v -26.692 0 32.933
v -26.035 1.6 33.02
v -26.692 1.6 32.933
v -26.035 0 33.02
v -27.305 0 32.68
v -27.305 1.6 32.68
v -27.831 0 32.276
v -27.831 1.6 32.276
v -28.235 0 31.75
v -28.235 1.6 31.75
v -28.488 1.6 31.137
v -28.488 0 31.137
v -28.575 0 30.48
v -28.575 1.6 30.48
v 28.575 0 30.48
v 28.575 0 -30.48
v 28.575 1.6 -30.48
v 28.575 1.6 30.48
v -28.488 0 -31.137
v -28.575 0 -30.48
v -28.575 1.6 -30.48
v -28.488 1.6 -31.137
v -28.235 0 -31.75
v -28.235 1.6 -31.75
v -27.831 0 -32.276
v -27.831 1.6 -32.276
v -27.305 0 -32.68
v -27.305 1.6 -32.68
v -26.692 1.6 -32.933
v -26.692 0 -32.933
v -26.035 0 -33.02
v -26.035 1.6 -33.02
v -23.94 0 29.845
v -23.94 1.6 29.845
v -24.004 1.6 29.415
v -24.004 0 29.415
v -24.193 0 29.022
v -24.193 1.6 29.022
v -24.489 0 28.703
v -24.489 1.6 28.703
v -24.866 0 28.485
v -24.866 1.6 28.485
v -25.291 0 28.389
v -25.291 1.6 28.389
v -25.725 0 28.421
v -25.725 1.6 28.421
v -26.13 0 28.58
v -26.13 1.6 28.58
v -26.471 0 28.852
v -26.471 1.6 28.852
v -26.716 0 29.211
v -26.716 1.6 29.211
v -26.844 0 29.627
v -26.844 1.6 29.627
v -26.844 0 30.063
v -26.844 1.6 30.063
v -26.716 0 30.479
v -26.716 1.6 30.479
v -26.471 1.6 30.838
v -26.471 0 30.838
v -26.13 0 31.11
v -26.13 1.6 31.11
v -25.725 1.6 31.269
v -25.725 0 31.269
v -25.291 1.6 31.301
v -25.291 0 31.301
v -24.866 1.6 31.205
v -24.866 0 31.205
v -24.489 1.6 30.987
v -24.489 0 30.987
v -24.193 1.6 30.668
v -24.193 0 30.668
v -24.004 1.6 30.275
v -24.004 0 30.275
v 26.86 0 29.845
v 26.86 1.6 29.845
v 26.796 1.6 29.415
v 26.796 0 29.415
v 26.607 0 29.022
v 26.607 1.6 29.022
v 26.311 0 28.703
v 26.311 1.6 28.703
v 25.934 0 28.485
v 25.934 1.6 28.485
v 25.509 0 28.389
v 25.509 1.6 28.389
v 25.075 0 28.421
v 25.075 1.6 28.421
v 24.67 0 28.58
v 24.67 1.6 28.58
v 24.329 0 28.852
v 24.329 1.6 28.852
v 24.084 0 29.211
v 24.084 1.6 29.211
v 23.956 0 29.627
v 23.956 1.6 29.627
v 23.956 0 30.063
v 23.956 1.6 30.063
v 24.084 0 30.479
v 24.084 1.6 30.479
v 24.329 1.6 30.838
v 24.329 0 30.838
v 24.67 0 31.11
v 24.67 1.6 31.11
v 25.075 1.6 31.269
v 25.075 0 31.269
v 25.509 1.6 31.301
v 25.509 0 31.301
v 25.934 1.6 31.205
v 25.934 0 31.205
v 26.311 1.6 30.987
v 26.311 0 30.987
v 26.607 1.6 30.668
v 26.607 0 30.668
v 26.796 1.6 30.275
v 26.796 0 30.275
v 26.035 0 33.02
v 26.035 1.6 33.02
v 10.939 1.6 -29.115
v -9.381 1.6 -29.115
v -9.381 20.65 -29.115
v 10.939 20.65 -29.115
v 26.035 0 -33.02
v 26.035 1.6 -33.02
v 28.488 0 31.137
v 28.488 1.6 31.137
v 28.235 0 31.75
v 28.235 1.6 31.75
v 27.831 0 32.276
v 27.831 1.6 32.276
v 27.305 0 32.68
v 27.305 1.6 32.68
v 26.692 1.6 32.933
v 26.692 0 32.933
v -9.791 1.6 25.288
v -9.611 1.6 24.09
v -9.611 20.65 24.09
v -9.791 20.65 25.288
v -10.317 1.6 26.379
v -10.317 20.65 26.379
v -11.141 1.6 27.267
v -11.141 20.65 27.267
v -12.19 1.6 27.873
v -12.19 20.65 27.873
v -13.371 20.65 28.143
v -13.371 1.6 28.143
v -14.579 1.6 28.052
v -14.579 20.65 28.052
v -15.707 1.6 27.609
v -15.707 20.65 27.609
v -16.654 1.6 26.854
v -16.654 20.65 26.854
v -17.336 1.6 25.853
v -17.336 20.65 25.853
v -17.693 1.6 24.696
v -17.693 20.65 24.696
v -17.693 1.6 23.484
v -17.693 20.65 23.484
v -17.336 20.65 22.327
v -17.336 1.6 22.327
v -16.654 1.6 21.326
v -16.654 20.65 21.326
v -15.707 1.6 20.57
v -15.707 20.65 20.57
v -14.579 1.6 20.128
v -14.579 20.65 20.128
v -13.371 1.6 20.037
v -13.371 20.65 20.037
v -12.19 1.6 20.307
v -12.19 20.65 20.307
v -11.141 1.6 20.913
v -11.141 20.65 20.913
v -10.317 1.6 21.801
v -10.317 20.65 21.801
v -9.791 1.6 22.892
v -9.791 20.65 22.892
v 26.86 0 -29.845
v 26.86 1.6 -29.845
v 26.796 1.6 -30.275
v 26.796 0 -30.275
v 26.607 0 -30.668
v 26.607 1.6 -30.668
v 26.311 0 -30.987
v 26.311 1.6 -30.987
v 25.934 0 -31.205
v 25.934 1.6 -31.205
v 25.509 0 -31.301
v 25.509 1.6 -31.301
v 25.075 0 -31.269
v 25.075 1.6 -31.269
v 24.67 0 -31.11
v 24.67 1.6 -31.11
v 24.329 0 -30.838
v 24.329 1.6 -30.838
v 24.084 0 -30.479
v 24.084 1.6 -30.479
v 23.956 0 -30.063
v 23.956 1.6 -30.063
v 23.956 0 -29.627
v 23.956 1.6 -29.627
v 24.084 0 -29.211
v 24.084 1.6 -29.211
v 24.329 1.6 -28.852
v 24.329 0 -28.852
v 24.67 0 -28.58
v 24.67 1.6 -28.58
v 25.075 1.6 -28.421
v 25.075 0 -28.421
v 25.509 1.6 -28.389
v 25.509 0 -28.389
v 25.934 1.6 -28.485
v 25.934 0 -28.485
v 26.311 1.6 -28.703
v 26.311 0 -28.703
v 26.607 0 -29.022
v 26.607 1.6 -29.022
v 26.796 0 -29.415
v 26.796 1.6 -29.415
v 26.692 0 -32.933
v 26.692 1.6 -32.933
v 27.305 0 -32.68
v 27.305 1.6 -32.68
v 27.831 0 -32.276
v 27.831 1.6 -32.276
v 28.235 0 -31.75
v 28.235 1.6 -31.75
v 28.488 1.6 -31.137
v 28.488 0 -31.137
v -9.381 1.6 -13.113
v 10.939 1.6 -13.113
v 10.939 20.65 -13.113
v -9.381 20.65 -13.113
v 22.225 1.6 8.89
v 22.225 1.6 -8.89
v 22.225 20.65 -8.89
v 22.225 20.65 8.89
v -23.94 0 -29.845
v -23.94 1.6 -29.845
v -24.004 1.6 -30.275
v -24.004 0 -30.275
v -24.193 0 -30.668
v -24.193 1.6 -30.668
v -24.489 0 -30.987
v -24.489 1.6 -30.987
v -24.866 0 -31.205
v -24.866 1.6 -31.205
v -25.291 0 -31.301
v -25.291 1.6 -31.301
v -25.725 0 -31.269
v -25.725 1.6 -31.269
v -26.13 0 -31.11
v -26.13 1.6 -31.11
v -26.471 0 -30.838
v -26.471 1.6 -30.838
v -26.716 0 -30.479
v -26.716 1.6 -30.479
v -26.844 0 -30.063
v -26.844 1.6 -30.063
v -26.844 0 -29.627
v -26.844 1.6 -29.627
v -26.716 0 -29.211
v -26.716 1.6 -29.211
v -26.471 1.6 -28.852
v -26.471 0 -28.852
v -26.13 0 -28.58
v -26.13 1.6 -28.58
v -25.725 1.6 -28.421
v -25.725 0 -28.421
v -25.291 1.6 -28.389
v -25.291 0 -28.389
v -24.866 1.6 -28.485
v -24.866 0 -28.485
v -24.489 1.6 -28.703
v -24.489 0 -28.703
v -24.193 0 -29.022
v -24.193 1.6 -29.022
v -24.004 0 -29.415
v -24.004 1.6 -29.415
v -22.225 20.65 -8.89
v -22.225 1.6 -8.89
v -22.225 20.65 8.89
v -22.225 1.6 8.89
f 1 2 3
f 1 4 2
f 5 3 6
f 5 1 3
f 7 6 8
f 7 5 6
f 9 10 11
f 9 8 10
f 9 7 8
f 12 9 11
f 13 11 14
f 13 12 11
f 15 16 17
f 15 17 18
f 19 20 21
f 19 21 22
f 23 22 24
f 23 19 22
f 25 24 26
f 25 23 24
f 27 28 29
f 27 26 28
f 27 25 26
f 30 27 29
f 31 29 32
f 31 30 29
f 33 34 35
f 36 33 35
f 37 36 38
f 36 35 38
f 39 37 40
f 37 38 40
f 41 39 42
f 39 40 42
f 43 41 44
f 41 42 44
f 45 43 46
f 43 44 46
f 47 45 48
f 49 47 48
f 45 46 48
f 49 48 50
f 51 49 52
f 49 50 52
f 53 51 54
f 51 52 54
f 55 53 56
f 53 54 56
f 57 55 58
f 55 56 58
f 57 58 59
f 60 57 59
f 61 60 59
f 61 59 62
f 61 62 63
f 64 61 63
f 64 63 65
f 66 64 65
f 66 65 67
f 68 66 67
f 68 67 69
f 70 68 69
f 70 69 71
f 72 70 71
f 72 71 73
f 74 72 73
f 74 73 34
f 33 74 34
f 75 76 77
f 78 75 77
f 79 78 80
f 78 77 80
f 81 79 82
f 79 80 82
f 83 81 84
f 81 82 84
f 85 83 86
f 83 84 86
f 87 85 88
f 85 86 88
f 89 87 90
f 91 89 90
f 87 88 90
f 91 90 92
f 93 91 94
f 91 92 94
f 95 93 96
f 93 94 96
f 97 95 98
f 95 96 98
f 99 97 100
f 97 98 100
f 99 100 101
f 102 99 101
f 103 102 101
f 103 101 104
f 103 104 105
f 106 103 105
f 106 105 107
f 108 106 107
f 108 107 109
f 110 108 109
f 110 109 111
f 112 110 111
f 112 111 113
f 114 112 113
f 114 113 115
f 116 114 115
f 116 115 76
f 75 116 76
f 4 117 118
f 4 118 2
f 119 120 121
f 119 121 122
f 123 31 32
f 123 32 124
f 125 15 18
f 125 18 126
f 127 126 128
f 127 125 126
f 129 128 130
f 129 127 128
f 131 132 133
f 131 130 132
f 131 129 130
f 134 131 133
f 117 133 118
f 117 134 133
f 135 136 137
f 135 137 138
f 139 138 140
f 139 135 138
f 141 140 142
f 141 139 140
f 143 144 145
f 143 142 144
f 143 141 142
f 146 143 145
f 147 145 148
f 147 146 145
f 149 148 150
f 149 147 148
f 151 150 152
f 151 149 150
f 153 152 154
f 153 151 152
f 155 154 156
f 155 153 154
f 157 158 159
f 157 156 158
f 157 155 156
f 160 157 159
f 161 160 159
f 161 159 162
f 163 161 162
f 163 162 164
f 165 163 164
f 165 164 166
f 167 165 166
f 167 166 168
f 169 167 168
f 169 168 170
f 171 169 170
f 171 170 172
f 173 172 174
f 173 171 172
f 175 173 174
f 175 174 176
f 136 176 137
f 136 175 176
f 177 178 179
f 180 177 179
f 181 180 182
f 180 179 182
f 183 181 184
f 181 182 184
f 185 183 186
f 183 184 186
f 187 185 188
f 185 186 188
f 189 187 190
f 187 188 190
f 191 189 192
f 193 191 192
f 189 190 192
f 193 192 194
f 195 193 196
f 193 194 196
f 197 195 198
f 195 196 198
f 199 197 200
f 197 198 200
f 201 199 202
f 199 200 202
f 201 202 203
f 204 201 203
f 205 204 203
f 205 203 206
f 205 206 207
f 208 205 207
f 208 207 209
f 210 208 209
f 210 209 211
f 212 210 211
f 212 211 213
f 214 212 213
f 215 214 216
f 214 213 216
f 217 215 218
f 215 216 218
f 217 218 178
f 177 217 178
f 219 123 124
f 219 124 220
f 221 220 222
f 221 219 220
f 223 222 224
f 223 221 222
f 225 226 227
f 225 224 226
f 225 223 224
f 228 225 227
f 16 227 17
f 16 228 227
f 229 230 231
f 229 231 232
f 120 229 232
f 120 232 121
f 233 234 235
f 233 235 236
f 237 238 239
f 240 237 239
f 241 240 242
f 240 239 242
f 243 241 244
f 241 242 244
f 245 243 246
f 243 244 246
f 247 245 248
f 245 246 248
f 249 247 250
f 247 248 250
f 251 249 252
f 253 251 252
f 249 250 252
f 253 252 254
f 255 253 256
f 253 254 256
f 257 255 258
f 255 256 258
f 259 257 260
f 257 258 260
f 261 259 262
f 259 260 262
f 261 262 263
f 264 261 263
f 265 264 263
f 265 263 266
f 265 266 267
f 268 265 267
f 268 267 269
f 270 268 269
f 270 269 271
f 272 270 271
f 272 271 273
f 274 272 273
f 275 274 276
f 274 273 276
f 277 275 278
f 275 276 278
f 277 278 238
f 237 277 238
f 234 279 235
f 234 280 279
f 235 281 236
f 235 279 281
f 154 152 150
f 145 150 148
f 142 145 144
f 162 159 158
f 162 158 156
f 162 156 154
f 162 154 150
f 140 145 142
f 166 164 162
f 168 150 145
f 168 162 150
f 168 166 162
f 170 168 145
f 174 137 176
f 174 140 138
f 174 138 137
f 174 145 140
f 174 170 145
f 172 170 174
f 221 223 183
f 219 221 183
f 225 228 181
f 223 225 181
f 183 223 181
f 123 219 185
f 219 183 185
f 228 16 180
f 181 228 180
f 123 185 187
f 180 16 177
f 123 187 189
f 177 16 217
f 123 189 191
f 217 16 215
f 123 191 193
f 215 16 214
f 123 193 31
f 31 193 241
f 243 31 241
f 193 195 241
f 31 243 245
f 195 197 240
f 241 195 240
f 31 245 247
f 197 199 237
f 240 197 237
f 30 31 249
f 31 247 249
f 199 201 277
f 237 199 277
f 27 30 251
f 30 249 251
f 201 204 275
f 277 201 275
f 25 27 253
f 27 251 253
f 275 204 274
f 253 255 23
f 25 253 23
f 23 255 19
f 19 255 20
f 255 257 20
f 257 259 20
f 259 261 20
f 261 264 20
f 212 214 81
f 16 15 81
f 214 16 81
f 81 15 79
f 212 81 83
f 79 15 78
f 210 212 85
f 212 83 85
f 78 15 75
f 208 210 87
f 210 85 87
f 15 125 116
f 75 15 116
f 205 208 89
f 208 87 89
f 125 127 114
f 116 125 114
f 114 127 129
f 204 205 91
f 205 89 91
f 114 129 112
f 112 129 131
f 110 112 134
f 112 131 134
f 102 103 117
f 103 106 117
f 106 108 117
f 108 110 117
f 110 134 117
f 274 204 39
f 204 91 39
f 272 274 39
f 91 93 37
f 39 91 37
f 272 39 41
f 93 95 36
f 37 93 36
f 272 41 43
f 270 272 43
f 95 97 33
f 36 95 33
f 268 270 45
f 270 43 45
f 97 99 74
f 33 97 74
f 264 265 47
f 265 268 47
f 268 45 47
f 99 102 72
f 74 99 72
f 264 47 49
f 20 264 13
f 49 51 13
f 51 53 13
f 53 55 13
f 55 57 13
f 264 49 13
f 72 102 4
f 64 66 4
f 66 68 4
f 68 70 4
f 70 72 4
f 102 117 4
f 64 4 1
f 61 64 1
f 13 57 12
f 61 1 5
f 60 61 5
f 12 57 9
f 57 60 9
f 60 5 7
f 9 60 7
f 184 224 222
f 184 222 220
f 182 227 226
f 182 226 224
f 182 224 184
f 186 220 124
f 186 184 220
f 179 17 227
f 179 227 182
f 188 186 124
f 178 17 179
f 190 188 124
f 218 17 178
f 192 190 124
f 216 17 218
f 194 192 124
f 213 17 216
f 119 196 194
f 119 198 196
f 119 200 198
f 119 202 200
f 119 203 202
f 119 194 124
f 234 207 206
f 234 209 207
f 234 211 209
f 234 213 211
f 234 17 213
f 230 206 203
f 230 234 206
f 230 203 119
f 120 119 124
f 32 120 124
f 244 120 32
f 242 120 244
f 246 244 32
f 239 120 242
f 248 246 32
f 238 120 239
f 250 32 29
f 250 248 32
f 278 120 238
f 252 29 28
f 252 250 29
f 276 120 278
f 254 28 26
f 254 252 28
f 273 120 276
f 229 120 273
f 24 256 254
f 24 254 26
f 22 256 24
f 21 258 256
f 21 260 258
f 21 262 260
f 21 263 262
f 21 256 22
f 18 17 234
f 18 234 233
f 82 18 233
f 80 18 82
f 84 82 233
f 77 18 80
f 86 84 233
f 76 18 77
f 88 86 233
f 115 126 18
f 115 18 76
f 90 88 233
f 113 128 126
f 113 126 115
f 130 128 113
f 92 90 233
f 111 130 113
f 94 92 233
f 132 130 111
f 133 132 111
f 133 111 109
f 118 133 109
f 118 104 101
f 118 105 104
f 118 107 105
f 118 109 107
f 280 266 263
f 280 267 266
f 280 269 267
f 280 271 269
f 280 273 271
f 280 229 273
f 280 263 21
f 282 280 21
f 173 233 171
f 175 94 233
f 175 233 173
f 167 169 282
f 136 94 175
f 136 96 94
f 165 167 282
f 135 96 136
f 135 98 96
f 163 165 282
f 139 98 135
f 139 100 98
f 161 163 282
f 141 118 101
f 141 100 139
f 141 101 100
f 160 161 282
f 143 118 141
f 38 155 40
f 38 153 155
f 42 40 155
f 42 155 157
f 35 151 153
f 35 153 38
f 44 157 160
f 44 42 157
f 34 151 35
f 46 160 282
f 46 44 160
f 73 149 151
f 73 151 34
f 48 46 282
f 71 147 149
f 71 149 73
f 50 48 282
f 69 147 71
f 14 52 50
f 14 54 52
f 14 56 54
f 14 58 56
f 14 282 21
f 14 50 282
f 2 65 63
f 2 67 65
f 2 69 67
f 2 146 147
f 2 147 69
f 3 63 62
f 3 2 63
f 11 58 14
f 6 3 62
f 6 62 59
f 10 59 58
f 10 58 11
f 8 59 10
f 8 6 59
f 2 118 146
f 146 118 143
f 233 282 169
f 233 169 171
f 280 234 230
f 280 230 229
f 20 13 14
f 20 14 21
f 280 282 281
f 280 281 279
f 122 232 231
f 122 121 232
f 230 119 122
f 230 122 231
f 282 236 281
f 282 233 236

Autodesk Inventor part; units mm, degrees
ref_plane "YZ Plane" through (0, 0, 0) normal (1, 0, 0) x (0, 1, 0)
ref_plane "XZ Plane" through (0, 0, 0) normal (0, 1, 0) x (-1, 0, 0)
ref_plane "XY Plane" through (0, 0, 0) normal (0, 0, 1) x (1, 0, 0)
sketch "Sketch1" plane through (0, 0, 0) normal (0, 1, 0) x (-1, 0, 0)
  line L0 (-26.035, 33.02) -> (26.035, 33.02)
  line L1 (28.575, 30.48) -> (28.575, -30.48)
  line L2 (26.035, -33.02) -> (-26.035, -33.02)
  line L3 (-28.575, -30.48) -> (-28.575, 30.48)
  line L4 (-28.575, 33.02) -> (28.575, -33.02) construction
  line L5 (28.575, 33.02) -> (-28.575, -33.02) construction
  arc A0 (26.035, -33.02) -> (28.575, -30.48) centre (26.035, -30.48) ccw
  arc A1 (28.575, 30.48) -> (26.035, 33.02) centre (26.035, 30.48) ccw
  arc A2 (-26.035, 33.02) -> (-28.575, 30.48) centre (-26.035, 30.48) ccw
  arc A3 (-28.575, -30.48) -> (-26.035, -33.02) centre (-26.035, -30.48) ccw
  point P0 (0, 0)
  dimension "d0" = 57.15
  dimension "d1" = 66.04
  dimension "d2" = 2.54
extrude "Extrusion1" add sketch "Sketch1" along normal blind 1.6
sketch "Sketch2" plane through (0, 1.6, 0) normal (0, 1, 0) x (1, 0, 0)
  line L0 (25.4, -29.845) -> (-25.4, -29.845) construction
  line L1 (-25.4, -29.845) -> (-25.4, 29.845) construction
  line L2 (-25.4, 29.845) -> (25.4, 29.845) construction
  line L3 (25.4, 29.845) -> (25.4, -29.845) construction
  line L4 (25.4, -29.845) -> (-25.4, 29.845) construction
  line L5 (-25.4, -29.845) -> (25.4, 29.845) construction
  circle A0 centre (-25.4, 29.845) radius 1.4605
  circle A1 centre (-25.4, -29.845) radius 1.4605
  circle A2 centre (25.4, -29.845) radius 1.4605
  circle A3 centre (25.4, 29.845) radius 1.4605
  point P0 (0, 0)
  dimension "d5" = 50.8
  dimension "d6" = 59.69
  dimension "d7" = 2.921
extrude "Extrusion2" cut sketch "Sketch2" against normal through all
sketch "Sketch3" plane through (0, 1.6, 0) normal (0, 1, 0) x (1, 0, 0)
  line L0 (-22.225, 8.89) -> (22.225, 8.89)
  line L1 (22.225, 8.89) -> (22.225, -8.89)
  line L2 (22.225, -8.89) -> (-22.225, -8.89)
  line L3 (-22.225, -8.89) -> (-22.225, 8.89)
  line L4 (-22.225, 8.89) -> (22.225, -8.89) construction
  line L5 (22.225, 8.89) -> (-22.225, -8.89) construction
  line L6 (10.9394, 13.1131) -> (-9.3806, 13.1131)
  line L7 (-9.3806, 13.1131) -> (-9.3806, 29.1151)
  line L8 (-9.3806, 29.1151) -> (10.9394, 29.1151)
  line L9 (10.9394, 29.1151) -> (10.9394, 13.1131)
  line L10 (10.9394, 13.1131) -> (-9.3806, 29.1151) construction
  line L11 (-9.3806, 13.1131) -> (10.9394, 29.1151) construction
  circle A0 centre (-13.6746, -24.0899) radius 4.064
  point P0 (0, 0)
  point P1 (0.7794, 21.1141)
  dimension "d10" = 8.128
  dimension "d11" = 17.78
  dimension "d12" = 44.45
  dimension "d13" = 16.002
  dimension "d14" = 20.32
extrude "Extrusion3" add sketch "Sketch3" along normal blind 19.05
properties part number "pcb"
